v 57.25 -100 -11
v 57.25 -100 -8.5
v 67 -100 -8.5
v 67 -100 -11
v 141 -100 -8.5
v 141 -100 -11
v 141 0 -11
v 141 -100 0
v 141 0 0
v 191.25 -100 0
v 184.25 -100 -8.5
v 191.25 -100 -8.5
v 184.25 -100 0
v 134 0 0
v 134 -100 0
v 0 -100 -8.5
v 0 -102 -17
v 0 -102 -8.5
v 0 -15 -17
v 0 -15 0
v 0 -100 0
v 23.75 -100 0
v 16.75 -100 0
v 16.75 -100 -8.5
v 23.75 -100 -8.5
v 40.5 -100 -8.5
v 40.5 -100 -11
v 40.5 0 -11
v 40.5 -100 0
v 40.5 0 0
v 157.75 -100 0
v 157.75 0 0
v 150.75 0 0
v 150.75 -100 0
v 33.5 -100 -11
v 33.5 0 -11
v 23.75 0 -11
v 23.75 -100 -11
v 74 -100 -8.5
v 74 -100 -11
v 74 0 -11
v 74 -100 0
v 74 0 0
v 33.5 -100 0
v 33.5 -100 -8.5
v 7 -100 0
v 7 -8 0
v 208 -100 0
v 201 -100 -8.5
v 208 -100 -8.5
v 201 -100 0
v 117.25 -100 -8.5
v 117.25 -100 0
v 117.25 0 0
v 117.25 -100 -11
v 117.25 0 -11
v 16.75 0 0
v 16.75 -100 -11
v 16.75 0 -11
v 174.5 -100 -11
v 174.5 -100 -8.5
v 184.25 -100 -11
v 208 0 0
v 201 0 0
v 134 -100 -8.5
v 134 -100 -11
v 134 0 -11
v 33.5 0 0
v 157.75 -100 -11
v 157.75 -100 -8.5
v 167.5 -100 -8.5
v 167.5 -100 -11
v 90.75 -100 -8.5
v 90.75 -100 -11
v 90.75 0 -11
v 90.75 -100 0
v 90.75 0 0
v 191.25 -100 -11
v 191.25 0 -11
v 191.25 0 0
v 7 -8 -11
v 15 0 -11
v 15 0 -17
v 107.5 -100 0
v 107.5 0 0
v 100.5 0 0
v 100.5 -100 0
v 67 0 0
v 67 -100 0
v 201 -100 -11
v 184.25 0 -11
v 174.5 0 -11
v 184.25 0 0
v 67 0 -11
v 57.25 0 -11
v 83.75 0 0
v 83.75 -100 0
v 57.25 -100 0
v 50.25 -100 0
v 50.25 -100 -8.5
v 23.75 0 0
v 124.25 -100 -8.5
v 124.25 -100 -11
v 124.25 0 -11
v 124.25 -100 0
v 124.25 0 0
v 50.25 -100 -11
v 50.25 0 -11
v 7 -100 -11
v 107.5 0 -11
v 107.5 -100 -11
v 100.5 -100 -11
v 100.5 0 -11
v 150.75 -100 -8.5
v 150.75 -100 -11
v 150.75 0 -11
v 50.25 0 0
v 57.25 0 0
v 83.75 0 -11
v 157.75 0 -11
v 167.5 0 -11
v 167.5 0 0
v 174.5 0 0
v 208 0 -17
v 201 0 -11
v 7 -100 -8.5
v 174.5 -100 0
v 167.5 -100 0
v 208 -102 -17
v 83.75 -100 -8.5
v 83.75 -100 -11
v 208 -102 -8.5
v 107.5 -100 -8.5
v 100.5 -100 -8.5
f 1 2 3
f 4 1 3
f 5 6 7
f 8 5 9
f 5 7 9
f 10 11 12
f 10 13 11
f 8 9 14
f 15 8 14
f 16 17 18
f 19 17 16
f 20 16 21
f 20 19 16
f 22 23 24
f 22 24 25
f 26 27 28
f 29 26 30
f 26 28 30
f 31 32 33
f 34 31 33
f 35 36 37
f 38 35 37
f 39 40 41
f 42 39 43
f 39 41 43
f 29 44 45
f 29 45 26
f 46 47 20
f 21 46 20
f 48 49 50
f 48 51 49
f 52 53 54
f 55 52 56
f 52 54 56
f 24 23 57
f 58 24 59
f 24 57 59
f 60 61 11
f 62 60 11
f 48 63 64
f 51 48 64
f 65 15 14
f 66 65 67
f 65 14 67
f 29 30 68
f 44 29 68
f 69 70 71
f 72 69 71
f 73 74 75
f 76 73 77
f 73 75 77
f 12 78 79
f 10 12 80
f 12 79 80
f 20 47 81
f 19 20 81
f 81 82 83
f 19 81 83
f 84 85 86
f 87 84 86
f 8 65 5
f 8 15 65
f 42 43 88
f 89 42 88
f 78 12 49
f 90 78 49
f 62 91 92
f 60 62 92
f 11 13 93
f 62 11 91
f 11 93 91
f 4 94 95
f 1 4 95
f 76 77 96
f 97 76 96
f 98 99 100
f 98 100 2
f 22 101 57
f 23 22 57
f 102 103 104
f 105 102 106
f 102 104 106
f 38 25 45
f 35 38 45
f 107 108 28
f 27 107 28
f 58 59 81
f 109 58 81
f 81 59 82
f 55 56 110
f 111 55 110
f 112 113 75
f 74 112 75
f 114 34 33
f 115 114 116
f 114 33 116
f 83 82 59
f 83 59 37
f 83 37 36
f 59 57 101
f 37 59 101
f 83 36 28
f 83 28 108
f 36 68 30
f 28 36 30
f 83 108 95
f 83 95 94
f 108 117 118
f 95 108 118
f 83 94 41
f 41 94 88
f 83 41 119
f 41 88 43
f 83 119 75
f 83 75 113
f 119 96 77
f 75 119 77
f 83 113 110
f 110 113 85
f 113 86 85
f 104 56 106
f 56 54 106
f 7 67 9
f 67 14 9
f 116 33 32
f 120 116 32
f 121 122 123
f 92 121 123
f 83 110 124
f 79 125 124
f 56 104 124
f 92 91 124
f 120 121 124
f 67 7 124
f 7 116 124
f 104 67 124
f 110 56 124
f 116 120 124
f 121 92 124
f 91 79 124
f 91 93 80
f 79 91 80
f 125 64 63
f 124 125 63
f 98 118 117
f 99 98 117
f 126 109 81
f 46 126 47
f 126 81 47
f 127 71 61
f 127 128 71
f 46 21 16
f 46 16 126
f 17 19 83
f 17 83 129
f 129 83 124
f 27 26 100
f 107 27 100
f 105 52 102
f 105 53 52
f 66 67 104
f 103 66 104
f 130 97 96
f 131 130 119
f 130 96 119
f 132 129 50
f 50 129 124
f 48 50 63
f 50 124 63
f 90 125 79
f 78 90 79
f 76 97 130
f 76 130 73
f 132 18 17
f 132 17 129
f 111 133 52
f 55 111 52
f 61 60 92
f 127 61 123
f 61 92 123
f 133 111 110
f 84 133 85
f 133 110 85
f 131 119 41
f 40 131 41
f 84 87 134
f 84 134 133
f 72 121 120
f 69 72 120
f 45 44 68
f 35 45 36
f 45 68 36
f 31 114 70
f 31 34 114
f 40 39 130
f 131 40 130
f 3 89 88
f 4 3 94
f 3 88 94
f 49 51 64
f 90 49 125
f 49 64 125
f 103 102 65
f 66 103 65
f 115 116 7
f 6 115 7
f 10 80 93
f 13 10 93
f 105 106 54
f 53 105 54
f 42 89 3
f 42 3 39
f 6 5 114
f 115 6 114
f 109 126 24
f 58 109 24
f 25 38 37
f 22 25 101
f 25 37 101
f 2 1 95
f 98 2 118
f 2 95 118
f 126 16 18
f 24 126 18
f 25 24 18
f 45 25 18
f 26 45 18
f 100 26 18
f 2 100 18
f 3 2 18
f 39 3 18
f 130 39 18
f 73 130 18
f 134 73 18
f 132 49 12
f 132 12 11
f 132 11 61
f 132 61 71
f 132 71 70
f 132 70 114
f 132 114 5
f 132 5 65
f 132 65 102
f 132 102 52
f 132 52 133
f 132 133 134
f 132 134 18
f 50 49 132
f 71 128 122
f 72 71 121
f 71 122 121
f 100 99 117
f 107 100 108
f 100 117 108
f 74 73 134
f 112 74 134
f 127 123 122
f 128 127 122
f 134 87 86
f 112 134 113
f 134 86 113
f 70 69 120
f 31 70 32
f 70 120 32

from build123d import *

# Parameters (mm, degrees)
F1_DEPTH = 100
F2_SIZE2 = 15
F2_SIZE  = 15
F3_W     = 208
F3_H     = 8.5
F4_DEPTH = 2


with BuildPart() as f1:
    # F0 (on Front) → F1 (new body)
    with BuildSketch(Plane.XZ):
        Polygon((7, 0), (0, 0), (0, -17), (208, -17), (208, 0), (201, 0), (201, -11), (191.25, -11), (191.25, 0), (184.25, 0), (184.25, -11), (174.5, -11), (174.5, 0), (167.5, 0), (167.5, -11), (157.75, -11), (157.75, 0), (150.75, 0), (150.75, -11), (141, -11), (141, 0), (134, 0), (134, -11), (124.25, -11), (124.25, 0), (117.25, 0), (117.25, -11), (107.5, -11), (107.5, 0), (100.5, 0), (100.5, -11), (90.75, -11), (90.75, 0), (83.75, 0), (83.75, -11), (74, -11), (74, 0), (67, 0), (67, -11), (57.25, -11), (57.25, 0), (50.25, 0), (50.25, -11), (40.5, -11), (40.5, 0), (33.5, 0), (33.5, -11), (23.75, -11), (23.75, 0), (16.75, 0), (16.75, -11), (7, -11), align=None)
    extrude(amount=F1_DEPTH)

    # F2
    f2_edges = [f1.edges().sort_by_distance(p)[0] for p in [
        (0, 0, -8.5),
    ]]
    chamfer(f2_edges, length=F2_SIZE, length2=F2_SIZE2)

    # F3 (on face) → F4 (join)
    with BuildSketch(Plane.XZ.offset(100)):
        with Locations((104, -12.75)):
            Rectangle(F3_W, F3_H)
    extrude(amount=F4_DEPTH)


solid = f1.part
